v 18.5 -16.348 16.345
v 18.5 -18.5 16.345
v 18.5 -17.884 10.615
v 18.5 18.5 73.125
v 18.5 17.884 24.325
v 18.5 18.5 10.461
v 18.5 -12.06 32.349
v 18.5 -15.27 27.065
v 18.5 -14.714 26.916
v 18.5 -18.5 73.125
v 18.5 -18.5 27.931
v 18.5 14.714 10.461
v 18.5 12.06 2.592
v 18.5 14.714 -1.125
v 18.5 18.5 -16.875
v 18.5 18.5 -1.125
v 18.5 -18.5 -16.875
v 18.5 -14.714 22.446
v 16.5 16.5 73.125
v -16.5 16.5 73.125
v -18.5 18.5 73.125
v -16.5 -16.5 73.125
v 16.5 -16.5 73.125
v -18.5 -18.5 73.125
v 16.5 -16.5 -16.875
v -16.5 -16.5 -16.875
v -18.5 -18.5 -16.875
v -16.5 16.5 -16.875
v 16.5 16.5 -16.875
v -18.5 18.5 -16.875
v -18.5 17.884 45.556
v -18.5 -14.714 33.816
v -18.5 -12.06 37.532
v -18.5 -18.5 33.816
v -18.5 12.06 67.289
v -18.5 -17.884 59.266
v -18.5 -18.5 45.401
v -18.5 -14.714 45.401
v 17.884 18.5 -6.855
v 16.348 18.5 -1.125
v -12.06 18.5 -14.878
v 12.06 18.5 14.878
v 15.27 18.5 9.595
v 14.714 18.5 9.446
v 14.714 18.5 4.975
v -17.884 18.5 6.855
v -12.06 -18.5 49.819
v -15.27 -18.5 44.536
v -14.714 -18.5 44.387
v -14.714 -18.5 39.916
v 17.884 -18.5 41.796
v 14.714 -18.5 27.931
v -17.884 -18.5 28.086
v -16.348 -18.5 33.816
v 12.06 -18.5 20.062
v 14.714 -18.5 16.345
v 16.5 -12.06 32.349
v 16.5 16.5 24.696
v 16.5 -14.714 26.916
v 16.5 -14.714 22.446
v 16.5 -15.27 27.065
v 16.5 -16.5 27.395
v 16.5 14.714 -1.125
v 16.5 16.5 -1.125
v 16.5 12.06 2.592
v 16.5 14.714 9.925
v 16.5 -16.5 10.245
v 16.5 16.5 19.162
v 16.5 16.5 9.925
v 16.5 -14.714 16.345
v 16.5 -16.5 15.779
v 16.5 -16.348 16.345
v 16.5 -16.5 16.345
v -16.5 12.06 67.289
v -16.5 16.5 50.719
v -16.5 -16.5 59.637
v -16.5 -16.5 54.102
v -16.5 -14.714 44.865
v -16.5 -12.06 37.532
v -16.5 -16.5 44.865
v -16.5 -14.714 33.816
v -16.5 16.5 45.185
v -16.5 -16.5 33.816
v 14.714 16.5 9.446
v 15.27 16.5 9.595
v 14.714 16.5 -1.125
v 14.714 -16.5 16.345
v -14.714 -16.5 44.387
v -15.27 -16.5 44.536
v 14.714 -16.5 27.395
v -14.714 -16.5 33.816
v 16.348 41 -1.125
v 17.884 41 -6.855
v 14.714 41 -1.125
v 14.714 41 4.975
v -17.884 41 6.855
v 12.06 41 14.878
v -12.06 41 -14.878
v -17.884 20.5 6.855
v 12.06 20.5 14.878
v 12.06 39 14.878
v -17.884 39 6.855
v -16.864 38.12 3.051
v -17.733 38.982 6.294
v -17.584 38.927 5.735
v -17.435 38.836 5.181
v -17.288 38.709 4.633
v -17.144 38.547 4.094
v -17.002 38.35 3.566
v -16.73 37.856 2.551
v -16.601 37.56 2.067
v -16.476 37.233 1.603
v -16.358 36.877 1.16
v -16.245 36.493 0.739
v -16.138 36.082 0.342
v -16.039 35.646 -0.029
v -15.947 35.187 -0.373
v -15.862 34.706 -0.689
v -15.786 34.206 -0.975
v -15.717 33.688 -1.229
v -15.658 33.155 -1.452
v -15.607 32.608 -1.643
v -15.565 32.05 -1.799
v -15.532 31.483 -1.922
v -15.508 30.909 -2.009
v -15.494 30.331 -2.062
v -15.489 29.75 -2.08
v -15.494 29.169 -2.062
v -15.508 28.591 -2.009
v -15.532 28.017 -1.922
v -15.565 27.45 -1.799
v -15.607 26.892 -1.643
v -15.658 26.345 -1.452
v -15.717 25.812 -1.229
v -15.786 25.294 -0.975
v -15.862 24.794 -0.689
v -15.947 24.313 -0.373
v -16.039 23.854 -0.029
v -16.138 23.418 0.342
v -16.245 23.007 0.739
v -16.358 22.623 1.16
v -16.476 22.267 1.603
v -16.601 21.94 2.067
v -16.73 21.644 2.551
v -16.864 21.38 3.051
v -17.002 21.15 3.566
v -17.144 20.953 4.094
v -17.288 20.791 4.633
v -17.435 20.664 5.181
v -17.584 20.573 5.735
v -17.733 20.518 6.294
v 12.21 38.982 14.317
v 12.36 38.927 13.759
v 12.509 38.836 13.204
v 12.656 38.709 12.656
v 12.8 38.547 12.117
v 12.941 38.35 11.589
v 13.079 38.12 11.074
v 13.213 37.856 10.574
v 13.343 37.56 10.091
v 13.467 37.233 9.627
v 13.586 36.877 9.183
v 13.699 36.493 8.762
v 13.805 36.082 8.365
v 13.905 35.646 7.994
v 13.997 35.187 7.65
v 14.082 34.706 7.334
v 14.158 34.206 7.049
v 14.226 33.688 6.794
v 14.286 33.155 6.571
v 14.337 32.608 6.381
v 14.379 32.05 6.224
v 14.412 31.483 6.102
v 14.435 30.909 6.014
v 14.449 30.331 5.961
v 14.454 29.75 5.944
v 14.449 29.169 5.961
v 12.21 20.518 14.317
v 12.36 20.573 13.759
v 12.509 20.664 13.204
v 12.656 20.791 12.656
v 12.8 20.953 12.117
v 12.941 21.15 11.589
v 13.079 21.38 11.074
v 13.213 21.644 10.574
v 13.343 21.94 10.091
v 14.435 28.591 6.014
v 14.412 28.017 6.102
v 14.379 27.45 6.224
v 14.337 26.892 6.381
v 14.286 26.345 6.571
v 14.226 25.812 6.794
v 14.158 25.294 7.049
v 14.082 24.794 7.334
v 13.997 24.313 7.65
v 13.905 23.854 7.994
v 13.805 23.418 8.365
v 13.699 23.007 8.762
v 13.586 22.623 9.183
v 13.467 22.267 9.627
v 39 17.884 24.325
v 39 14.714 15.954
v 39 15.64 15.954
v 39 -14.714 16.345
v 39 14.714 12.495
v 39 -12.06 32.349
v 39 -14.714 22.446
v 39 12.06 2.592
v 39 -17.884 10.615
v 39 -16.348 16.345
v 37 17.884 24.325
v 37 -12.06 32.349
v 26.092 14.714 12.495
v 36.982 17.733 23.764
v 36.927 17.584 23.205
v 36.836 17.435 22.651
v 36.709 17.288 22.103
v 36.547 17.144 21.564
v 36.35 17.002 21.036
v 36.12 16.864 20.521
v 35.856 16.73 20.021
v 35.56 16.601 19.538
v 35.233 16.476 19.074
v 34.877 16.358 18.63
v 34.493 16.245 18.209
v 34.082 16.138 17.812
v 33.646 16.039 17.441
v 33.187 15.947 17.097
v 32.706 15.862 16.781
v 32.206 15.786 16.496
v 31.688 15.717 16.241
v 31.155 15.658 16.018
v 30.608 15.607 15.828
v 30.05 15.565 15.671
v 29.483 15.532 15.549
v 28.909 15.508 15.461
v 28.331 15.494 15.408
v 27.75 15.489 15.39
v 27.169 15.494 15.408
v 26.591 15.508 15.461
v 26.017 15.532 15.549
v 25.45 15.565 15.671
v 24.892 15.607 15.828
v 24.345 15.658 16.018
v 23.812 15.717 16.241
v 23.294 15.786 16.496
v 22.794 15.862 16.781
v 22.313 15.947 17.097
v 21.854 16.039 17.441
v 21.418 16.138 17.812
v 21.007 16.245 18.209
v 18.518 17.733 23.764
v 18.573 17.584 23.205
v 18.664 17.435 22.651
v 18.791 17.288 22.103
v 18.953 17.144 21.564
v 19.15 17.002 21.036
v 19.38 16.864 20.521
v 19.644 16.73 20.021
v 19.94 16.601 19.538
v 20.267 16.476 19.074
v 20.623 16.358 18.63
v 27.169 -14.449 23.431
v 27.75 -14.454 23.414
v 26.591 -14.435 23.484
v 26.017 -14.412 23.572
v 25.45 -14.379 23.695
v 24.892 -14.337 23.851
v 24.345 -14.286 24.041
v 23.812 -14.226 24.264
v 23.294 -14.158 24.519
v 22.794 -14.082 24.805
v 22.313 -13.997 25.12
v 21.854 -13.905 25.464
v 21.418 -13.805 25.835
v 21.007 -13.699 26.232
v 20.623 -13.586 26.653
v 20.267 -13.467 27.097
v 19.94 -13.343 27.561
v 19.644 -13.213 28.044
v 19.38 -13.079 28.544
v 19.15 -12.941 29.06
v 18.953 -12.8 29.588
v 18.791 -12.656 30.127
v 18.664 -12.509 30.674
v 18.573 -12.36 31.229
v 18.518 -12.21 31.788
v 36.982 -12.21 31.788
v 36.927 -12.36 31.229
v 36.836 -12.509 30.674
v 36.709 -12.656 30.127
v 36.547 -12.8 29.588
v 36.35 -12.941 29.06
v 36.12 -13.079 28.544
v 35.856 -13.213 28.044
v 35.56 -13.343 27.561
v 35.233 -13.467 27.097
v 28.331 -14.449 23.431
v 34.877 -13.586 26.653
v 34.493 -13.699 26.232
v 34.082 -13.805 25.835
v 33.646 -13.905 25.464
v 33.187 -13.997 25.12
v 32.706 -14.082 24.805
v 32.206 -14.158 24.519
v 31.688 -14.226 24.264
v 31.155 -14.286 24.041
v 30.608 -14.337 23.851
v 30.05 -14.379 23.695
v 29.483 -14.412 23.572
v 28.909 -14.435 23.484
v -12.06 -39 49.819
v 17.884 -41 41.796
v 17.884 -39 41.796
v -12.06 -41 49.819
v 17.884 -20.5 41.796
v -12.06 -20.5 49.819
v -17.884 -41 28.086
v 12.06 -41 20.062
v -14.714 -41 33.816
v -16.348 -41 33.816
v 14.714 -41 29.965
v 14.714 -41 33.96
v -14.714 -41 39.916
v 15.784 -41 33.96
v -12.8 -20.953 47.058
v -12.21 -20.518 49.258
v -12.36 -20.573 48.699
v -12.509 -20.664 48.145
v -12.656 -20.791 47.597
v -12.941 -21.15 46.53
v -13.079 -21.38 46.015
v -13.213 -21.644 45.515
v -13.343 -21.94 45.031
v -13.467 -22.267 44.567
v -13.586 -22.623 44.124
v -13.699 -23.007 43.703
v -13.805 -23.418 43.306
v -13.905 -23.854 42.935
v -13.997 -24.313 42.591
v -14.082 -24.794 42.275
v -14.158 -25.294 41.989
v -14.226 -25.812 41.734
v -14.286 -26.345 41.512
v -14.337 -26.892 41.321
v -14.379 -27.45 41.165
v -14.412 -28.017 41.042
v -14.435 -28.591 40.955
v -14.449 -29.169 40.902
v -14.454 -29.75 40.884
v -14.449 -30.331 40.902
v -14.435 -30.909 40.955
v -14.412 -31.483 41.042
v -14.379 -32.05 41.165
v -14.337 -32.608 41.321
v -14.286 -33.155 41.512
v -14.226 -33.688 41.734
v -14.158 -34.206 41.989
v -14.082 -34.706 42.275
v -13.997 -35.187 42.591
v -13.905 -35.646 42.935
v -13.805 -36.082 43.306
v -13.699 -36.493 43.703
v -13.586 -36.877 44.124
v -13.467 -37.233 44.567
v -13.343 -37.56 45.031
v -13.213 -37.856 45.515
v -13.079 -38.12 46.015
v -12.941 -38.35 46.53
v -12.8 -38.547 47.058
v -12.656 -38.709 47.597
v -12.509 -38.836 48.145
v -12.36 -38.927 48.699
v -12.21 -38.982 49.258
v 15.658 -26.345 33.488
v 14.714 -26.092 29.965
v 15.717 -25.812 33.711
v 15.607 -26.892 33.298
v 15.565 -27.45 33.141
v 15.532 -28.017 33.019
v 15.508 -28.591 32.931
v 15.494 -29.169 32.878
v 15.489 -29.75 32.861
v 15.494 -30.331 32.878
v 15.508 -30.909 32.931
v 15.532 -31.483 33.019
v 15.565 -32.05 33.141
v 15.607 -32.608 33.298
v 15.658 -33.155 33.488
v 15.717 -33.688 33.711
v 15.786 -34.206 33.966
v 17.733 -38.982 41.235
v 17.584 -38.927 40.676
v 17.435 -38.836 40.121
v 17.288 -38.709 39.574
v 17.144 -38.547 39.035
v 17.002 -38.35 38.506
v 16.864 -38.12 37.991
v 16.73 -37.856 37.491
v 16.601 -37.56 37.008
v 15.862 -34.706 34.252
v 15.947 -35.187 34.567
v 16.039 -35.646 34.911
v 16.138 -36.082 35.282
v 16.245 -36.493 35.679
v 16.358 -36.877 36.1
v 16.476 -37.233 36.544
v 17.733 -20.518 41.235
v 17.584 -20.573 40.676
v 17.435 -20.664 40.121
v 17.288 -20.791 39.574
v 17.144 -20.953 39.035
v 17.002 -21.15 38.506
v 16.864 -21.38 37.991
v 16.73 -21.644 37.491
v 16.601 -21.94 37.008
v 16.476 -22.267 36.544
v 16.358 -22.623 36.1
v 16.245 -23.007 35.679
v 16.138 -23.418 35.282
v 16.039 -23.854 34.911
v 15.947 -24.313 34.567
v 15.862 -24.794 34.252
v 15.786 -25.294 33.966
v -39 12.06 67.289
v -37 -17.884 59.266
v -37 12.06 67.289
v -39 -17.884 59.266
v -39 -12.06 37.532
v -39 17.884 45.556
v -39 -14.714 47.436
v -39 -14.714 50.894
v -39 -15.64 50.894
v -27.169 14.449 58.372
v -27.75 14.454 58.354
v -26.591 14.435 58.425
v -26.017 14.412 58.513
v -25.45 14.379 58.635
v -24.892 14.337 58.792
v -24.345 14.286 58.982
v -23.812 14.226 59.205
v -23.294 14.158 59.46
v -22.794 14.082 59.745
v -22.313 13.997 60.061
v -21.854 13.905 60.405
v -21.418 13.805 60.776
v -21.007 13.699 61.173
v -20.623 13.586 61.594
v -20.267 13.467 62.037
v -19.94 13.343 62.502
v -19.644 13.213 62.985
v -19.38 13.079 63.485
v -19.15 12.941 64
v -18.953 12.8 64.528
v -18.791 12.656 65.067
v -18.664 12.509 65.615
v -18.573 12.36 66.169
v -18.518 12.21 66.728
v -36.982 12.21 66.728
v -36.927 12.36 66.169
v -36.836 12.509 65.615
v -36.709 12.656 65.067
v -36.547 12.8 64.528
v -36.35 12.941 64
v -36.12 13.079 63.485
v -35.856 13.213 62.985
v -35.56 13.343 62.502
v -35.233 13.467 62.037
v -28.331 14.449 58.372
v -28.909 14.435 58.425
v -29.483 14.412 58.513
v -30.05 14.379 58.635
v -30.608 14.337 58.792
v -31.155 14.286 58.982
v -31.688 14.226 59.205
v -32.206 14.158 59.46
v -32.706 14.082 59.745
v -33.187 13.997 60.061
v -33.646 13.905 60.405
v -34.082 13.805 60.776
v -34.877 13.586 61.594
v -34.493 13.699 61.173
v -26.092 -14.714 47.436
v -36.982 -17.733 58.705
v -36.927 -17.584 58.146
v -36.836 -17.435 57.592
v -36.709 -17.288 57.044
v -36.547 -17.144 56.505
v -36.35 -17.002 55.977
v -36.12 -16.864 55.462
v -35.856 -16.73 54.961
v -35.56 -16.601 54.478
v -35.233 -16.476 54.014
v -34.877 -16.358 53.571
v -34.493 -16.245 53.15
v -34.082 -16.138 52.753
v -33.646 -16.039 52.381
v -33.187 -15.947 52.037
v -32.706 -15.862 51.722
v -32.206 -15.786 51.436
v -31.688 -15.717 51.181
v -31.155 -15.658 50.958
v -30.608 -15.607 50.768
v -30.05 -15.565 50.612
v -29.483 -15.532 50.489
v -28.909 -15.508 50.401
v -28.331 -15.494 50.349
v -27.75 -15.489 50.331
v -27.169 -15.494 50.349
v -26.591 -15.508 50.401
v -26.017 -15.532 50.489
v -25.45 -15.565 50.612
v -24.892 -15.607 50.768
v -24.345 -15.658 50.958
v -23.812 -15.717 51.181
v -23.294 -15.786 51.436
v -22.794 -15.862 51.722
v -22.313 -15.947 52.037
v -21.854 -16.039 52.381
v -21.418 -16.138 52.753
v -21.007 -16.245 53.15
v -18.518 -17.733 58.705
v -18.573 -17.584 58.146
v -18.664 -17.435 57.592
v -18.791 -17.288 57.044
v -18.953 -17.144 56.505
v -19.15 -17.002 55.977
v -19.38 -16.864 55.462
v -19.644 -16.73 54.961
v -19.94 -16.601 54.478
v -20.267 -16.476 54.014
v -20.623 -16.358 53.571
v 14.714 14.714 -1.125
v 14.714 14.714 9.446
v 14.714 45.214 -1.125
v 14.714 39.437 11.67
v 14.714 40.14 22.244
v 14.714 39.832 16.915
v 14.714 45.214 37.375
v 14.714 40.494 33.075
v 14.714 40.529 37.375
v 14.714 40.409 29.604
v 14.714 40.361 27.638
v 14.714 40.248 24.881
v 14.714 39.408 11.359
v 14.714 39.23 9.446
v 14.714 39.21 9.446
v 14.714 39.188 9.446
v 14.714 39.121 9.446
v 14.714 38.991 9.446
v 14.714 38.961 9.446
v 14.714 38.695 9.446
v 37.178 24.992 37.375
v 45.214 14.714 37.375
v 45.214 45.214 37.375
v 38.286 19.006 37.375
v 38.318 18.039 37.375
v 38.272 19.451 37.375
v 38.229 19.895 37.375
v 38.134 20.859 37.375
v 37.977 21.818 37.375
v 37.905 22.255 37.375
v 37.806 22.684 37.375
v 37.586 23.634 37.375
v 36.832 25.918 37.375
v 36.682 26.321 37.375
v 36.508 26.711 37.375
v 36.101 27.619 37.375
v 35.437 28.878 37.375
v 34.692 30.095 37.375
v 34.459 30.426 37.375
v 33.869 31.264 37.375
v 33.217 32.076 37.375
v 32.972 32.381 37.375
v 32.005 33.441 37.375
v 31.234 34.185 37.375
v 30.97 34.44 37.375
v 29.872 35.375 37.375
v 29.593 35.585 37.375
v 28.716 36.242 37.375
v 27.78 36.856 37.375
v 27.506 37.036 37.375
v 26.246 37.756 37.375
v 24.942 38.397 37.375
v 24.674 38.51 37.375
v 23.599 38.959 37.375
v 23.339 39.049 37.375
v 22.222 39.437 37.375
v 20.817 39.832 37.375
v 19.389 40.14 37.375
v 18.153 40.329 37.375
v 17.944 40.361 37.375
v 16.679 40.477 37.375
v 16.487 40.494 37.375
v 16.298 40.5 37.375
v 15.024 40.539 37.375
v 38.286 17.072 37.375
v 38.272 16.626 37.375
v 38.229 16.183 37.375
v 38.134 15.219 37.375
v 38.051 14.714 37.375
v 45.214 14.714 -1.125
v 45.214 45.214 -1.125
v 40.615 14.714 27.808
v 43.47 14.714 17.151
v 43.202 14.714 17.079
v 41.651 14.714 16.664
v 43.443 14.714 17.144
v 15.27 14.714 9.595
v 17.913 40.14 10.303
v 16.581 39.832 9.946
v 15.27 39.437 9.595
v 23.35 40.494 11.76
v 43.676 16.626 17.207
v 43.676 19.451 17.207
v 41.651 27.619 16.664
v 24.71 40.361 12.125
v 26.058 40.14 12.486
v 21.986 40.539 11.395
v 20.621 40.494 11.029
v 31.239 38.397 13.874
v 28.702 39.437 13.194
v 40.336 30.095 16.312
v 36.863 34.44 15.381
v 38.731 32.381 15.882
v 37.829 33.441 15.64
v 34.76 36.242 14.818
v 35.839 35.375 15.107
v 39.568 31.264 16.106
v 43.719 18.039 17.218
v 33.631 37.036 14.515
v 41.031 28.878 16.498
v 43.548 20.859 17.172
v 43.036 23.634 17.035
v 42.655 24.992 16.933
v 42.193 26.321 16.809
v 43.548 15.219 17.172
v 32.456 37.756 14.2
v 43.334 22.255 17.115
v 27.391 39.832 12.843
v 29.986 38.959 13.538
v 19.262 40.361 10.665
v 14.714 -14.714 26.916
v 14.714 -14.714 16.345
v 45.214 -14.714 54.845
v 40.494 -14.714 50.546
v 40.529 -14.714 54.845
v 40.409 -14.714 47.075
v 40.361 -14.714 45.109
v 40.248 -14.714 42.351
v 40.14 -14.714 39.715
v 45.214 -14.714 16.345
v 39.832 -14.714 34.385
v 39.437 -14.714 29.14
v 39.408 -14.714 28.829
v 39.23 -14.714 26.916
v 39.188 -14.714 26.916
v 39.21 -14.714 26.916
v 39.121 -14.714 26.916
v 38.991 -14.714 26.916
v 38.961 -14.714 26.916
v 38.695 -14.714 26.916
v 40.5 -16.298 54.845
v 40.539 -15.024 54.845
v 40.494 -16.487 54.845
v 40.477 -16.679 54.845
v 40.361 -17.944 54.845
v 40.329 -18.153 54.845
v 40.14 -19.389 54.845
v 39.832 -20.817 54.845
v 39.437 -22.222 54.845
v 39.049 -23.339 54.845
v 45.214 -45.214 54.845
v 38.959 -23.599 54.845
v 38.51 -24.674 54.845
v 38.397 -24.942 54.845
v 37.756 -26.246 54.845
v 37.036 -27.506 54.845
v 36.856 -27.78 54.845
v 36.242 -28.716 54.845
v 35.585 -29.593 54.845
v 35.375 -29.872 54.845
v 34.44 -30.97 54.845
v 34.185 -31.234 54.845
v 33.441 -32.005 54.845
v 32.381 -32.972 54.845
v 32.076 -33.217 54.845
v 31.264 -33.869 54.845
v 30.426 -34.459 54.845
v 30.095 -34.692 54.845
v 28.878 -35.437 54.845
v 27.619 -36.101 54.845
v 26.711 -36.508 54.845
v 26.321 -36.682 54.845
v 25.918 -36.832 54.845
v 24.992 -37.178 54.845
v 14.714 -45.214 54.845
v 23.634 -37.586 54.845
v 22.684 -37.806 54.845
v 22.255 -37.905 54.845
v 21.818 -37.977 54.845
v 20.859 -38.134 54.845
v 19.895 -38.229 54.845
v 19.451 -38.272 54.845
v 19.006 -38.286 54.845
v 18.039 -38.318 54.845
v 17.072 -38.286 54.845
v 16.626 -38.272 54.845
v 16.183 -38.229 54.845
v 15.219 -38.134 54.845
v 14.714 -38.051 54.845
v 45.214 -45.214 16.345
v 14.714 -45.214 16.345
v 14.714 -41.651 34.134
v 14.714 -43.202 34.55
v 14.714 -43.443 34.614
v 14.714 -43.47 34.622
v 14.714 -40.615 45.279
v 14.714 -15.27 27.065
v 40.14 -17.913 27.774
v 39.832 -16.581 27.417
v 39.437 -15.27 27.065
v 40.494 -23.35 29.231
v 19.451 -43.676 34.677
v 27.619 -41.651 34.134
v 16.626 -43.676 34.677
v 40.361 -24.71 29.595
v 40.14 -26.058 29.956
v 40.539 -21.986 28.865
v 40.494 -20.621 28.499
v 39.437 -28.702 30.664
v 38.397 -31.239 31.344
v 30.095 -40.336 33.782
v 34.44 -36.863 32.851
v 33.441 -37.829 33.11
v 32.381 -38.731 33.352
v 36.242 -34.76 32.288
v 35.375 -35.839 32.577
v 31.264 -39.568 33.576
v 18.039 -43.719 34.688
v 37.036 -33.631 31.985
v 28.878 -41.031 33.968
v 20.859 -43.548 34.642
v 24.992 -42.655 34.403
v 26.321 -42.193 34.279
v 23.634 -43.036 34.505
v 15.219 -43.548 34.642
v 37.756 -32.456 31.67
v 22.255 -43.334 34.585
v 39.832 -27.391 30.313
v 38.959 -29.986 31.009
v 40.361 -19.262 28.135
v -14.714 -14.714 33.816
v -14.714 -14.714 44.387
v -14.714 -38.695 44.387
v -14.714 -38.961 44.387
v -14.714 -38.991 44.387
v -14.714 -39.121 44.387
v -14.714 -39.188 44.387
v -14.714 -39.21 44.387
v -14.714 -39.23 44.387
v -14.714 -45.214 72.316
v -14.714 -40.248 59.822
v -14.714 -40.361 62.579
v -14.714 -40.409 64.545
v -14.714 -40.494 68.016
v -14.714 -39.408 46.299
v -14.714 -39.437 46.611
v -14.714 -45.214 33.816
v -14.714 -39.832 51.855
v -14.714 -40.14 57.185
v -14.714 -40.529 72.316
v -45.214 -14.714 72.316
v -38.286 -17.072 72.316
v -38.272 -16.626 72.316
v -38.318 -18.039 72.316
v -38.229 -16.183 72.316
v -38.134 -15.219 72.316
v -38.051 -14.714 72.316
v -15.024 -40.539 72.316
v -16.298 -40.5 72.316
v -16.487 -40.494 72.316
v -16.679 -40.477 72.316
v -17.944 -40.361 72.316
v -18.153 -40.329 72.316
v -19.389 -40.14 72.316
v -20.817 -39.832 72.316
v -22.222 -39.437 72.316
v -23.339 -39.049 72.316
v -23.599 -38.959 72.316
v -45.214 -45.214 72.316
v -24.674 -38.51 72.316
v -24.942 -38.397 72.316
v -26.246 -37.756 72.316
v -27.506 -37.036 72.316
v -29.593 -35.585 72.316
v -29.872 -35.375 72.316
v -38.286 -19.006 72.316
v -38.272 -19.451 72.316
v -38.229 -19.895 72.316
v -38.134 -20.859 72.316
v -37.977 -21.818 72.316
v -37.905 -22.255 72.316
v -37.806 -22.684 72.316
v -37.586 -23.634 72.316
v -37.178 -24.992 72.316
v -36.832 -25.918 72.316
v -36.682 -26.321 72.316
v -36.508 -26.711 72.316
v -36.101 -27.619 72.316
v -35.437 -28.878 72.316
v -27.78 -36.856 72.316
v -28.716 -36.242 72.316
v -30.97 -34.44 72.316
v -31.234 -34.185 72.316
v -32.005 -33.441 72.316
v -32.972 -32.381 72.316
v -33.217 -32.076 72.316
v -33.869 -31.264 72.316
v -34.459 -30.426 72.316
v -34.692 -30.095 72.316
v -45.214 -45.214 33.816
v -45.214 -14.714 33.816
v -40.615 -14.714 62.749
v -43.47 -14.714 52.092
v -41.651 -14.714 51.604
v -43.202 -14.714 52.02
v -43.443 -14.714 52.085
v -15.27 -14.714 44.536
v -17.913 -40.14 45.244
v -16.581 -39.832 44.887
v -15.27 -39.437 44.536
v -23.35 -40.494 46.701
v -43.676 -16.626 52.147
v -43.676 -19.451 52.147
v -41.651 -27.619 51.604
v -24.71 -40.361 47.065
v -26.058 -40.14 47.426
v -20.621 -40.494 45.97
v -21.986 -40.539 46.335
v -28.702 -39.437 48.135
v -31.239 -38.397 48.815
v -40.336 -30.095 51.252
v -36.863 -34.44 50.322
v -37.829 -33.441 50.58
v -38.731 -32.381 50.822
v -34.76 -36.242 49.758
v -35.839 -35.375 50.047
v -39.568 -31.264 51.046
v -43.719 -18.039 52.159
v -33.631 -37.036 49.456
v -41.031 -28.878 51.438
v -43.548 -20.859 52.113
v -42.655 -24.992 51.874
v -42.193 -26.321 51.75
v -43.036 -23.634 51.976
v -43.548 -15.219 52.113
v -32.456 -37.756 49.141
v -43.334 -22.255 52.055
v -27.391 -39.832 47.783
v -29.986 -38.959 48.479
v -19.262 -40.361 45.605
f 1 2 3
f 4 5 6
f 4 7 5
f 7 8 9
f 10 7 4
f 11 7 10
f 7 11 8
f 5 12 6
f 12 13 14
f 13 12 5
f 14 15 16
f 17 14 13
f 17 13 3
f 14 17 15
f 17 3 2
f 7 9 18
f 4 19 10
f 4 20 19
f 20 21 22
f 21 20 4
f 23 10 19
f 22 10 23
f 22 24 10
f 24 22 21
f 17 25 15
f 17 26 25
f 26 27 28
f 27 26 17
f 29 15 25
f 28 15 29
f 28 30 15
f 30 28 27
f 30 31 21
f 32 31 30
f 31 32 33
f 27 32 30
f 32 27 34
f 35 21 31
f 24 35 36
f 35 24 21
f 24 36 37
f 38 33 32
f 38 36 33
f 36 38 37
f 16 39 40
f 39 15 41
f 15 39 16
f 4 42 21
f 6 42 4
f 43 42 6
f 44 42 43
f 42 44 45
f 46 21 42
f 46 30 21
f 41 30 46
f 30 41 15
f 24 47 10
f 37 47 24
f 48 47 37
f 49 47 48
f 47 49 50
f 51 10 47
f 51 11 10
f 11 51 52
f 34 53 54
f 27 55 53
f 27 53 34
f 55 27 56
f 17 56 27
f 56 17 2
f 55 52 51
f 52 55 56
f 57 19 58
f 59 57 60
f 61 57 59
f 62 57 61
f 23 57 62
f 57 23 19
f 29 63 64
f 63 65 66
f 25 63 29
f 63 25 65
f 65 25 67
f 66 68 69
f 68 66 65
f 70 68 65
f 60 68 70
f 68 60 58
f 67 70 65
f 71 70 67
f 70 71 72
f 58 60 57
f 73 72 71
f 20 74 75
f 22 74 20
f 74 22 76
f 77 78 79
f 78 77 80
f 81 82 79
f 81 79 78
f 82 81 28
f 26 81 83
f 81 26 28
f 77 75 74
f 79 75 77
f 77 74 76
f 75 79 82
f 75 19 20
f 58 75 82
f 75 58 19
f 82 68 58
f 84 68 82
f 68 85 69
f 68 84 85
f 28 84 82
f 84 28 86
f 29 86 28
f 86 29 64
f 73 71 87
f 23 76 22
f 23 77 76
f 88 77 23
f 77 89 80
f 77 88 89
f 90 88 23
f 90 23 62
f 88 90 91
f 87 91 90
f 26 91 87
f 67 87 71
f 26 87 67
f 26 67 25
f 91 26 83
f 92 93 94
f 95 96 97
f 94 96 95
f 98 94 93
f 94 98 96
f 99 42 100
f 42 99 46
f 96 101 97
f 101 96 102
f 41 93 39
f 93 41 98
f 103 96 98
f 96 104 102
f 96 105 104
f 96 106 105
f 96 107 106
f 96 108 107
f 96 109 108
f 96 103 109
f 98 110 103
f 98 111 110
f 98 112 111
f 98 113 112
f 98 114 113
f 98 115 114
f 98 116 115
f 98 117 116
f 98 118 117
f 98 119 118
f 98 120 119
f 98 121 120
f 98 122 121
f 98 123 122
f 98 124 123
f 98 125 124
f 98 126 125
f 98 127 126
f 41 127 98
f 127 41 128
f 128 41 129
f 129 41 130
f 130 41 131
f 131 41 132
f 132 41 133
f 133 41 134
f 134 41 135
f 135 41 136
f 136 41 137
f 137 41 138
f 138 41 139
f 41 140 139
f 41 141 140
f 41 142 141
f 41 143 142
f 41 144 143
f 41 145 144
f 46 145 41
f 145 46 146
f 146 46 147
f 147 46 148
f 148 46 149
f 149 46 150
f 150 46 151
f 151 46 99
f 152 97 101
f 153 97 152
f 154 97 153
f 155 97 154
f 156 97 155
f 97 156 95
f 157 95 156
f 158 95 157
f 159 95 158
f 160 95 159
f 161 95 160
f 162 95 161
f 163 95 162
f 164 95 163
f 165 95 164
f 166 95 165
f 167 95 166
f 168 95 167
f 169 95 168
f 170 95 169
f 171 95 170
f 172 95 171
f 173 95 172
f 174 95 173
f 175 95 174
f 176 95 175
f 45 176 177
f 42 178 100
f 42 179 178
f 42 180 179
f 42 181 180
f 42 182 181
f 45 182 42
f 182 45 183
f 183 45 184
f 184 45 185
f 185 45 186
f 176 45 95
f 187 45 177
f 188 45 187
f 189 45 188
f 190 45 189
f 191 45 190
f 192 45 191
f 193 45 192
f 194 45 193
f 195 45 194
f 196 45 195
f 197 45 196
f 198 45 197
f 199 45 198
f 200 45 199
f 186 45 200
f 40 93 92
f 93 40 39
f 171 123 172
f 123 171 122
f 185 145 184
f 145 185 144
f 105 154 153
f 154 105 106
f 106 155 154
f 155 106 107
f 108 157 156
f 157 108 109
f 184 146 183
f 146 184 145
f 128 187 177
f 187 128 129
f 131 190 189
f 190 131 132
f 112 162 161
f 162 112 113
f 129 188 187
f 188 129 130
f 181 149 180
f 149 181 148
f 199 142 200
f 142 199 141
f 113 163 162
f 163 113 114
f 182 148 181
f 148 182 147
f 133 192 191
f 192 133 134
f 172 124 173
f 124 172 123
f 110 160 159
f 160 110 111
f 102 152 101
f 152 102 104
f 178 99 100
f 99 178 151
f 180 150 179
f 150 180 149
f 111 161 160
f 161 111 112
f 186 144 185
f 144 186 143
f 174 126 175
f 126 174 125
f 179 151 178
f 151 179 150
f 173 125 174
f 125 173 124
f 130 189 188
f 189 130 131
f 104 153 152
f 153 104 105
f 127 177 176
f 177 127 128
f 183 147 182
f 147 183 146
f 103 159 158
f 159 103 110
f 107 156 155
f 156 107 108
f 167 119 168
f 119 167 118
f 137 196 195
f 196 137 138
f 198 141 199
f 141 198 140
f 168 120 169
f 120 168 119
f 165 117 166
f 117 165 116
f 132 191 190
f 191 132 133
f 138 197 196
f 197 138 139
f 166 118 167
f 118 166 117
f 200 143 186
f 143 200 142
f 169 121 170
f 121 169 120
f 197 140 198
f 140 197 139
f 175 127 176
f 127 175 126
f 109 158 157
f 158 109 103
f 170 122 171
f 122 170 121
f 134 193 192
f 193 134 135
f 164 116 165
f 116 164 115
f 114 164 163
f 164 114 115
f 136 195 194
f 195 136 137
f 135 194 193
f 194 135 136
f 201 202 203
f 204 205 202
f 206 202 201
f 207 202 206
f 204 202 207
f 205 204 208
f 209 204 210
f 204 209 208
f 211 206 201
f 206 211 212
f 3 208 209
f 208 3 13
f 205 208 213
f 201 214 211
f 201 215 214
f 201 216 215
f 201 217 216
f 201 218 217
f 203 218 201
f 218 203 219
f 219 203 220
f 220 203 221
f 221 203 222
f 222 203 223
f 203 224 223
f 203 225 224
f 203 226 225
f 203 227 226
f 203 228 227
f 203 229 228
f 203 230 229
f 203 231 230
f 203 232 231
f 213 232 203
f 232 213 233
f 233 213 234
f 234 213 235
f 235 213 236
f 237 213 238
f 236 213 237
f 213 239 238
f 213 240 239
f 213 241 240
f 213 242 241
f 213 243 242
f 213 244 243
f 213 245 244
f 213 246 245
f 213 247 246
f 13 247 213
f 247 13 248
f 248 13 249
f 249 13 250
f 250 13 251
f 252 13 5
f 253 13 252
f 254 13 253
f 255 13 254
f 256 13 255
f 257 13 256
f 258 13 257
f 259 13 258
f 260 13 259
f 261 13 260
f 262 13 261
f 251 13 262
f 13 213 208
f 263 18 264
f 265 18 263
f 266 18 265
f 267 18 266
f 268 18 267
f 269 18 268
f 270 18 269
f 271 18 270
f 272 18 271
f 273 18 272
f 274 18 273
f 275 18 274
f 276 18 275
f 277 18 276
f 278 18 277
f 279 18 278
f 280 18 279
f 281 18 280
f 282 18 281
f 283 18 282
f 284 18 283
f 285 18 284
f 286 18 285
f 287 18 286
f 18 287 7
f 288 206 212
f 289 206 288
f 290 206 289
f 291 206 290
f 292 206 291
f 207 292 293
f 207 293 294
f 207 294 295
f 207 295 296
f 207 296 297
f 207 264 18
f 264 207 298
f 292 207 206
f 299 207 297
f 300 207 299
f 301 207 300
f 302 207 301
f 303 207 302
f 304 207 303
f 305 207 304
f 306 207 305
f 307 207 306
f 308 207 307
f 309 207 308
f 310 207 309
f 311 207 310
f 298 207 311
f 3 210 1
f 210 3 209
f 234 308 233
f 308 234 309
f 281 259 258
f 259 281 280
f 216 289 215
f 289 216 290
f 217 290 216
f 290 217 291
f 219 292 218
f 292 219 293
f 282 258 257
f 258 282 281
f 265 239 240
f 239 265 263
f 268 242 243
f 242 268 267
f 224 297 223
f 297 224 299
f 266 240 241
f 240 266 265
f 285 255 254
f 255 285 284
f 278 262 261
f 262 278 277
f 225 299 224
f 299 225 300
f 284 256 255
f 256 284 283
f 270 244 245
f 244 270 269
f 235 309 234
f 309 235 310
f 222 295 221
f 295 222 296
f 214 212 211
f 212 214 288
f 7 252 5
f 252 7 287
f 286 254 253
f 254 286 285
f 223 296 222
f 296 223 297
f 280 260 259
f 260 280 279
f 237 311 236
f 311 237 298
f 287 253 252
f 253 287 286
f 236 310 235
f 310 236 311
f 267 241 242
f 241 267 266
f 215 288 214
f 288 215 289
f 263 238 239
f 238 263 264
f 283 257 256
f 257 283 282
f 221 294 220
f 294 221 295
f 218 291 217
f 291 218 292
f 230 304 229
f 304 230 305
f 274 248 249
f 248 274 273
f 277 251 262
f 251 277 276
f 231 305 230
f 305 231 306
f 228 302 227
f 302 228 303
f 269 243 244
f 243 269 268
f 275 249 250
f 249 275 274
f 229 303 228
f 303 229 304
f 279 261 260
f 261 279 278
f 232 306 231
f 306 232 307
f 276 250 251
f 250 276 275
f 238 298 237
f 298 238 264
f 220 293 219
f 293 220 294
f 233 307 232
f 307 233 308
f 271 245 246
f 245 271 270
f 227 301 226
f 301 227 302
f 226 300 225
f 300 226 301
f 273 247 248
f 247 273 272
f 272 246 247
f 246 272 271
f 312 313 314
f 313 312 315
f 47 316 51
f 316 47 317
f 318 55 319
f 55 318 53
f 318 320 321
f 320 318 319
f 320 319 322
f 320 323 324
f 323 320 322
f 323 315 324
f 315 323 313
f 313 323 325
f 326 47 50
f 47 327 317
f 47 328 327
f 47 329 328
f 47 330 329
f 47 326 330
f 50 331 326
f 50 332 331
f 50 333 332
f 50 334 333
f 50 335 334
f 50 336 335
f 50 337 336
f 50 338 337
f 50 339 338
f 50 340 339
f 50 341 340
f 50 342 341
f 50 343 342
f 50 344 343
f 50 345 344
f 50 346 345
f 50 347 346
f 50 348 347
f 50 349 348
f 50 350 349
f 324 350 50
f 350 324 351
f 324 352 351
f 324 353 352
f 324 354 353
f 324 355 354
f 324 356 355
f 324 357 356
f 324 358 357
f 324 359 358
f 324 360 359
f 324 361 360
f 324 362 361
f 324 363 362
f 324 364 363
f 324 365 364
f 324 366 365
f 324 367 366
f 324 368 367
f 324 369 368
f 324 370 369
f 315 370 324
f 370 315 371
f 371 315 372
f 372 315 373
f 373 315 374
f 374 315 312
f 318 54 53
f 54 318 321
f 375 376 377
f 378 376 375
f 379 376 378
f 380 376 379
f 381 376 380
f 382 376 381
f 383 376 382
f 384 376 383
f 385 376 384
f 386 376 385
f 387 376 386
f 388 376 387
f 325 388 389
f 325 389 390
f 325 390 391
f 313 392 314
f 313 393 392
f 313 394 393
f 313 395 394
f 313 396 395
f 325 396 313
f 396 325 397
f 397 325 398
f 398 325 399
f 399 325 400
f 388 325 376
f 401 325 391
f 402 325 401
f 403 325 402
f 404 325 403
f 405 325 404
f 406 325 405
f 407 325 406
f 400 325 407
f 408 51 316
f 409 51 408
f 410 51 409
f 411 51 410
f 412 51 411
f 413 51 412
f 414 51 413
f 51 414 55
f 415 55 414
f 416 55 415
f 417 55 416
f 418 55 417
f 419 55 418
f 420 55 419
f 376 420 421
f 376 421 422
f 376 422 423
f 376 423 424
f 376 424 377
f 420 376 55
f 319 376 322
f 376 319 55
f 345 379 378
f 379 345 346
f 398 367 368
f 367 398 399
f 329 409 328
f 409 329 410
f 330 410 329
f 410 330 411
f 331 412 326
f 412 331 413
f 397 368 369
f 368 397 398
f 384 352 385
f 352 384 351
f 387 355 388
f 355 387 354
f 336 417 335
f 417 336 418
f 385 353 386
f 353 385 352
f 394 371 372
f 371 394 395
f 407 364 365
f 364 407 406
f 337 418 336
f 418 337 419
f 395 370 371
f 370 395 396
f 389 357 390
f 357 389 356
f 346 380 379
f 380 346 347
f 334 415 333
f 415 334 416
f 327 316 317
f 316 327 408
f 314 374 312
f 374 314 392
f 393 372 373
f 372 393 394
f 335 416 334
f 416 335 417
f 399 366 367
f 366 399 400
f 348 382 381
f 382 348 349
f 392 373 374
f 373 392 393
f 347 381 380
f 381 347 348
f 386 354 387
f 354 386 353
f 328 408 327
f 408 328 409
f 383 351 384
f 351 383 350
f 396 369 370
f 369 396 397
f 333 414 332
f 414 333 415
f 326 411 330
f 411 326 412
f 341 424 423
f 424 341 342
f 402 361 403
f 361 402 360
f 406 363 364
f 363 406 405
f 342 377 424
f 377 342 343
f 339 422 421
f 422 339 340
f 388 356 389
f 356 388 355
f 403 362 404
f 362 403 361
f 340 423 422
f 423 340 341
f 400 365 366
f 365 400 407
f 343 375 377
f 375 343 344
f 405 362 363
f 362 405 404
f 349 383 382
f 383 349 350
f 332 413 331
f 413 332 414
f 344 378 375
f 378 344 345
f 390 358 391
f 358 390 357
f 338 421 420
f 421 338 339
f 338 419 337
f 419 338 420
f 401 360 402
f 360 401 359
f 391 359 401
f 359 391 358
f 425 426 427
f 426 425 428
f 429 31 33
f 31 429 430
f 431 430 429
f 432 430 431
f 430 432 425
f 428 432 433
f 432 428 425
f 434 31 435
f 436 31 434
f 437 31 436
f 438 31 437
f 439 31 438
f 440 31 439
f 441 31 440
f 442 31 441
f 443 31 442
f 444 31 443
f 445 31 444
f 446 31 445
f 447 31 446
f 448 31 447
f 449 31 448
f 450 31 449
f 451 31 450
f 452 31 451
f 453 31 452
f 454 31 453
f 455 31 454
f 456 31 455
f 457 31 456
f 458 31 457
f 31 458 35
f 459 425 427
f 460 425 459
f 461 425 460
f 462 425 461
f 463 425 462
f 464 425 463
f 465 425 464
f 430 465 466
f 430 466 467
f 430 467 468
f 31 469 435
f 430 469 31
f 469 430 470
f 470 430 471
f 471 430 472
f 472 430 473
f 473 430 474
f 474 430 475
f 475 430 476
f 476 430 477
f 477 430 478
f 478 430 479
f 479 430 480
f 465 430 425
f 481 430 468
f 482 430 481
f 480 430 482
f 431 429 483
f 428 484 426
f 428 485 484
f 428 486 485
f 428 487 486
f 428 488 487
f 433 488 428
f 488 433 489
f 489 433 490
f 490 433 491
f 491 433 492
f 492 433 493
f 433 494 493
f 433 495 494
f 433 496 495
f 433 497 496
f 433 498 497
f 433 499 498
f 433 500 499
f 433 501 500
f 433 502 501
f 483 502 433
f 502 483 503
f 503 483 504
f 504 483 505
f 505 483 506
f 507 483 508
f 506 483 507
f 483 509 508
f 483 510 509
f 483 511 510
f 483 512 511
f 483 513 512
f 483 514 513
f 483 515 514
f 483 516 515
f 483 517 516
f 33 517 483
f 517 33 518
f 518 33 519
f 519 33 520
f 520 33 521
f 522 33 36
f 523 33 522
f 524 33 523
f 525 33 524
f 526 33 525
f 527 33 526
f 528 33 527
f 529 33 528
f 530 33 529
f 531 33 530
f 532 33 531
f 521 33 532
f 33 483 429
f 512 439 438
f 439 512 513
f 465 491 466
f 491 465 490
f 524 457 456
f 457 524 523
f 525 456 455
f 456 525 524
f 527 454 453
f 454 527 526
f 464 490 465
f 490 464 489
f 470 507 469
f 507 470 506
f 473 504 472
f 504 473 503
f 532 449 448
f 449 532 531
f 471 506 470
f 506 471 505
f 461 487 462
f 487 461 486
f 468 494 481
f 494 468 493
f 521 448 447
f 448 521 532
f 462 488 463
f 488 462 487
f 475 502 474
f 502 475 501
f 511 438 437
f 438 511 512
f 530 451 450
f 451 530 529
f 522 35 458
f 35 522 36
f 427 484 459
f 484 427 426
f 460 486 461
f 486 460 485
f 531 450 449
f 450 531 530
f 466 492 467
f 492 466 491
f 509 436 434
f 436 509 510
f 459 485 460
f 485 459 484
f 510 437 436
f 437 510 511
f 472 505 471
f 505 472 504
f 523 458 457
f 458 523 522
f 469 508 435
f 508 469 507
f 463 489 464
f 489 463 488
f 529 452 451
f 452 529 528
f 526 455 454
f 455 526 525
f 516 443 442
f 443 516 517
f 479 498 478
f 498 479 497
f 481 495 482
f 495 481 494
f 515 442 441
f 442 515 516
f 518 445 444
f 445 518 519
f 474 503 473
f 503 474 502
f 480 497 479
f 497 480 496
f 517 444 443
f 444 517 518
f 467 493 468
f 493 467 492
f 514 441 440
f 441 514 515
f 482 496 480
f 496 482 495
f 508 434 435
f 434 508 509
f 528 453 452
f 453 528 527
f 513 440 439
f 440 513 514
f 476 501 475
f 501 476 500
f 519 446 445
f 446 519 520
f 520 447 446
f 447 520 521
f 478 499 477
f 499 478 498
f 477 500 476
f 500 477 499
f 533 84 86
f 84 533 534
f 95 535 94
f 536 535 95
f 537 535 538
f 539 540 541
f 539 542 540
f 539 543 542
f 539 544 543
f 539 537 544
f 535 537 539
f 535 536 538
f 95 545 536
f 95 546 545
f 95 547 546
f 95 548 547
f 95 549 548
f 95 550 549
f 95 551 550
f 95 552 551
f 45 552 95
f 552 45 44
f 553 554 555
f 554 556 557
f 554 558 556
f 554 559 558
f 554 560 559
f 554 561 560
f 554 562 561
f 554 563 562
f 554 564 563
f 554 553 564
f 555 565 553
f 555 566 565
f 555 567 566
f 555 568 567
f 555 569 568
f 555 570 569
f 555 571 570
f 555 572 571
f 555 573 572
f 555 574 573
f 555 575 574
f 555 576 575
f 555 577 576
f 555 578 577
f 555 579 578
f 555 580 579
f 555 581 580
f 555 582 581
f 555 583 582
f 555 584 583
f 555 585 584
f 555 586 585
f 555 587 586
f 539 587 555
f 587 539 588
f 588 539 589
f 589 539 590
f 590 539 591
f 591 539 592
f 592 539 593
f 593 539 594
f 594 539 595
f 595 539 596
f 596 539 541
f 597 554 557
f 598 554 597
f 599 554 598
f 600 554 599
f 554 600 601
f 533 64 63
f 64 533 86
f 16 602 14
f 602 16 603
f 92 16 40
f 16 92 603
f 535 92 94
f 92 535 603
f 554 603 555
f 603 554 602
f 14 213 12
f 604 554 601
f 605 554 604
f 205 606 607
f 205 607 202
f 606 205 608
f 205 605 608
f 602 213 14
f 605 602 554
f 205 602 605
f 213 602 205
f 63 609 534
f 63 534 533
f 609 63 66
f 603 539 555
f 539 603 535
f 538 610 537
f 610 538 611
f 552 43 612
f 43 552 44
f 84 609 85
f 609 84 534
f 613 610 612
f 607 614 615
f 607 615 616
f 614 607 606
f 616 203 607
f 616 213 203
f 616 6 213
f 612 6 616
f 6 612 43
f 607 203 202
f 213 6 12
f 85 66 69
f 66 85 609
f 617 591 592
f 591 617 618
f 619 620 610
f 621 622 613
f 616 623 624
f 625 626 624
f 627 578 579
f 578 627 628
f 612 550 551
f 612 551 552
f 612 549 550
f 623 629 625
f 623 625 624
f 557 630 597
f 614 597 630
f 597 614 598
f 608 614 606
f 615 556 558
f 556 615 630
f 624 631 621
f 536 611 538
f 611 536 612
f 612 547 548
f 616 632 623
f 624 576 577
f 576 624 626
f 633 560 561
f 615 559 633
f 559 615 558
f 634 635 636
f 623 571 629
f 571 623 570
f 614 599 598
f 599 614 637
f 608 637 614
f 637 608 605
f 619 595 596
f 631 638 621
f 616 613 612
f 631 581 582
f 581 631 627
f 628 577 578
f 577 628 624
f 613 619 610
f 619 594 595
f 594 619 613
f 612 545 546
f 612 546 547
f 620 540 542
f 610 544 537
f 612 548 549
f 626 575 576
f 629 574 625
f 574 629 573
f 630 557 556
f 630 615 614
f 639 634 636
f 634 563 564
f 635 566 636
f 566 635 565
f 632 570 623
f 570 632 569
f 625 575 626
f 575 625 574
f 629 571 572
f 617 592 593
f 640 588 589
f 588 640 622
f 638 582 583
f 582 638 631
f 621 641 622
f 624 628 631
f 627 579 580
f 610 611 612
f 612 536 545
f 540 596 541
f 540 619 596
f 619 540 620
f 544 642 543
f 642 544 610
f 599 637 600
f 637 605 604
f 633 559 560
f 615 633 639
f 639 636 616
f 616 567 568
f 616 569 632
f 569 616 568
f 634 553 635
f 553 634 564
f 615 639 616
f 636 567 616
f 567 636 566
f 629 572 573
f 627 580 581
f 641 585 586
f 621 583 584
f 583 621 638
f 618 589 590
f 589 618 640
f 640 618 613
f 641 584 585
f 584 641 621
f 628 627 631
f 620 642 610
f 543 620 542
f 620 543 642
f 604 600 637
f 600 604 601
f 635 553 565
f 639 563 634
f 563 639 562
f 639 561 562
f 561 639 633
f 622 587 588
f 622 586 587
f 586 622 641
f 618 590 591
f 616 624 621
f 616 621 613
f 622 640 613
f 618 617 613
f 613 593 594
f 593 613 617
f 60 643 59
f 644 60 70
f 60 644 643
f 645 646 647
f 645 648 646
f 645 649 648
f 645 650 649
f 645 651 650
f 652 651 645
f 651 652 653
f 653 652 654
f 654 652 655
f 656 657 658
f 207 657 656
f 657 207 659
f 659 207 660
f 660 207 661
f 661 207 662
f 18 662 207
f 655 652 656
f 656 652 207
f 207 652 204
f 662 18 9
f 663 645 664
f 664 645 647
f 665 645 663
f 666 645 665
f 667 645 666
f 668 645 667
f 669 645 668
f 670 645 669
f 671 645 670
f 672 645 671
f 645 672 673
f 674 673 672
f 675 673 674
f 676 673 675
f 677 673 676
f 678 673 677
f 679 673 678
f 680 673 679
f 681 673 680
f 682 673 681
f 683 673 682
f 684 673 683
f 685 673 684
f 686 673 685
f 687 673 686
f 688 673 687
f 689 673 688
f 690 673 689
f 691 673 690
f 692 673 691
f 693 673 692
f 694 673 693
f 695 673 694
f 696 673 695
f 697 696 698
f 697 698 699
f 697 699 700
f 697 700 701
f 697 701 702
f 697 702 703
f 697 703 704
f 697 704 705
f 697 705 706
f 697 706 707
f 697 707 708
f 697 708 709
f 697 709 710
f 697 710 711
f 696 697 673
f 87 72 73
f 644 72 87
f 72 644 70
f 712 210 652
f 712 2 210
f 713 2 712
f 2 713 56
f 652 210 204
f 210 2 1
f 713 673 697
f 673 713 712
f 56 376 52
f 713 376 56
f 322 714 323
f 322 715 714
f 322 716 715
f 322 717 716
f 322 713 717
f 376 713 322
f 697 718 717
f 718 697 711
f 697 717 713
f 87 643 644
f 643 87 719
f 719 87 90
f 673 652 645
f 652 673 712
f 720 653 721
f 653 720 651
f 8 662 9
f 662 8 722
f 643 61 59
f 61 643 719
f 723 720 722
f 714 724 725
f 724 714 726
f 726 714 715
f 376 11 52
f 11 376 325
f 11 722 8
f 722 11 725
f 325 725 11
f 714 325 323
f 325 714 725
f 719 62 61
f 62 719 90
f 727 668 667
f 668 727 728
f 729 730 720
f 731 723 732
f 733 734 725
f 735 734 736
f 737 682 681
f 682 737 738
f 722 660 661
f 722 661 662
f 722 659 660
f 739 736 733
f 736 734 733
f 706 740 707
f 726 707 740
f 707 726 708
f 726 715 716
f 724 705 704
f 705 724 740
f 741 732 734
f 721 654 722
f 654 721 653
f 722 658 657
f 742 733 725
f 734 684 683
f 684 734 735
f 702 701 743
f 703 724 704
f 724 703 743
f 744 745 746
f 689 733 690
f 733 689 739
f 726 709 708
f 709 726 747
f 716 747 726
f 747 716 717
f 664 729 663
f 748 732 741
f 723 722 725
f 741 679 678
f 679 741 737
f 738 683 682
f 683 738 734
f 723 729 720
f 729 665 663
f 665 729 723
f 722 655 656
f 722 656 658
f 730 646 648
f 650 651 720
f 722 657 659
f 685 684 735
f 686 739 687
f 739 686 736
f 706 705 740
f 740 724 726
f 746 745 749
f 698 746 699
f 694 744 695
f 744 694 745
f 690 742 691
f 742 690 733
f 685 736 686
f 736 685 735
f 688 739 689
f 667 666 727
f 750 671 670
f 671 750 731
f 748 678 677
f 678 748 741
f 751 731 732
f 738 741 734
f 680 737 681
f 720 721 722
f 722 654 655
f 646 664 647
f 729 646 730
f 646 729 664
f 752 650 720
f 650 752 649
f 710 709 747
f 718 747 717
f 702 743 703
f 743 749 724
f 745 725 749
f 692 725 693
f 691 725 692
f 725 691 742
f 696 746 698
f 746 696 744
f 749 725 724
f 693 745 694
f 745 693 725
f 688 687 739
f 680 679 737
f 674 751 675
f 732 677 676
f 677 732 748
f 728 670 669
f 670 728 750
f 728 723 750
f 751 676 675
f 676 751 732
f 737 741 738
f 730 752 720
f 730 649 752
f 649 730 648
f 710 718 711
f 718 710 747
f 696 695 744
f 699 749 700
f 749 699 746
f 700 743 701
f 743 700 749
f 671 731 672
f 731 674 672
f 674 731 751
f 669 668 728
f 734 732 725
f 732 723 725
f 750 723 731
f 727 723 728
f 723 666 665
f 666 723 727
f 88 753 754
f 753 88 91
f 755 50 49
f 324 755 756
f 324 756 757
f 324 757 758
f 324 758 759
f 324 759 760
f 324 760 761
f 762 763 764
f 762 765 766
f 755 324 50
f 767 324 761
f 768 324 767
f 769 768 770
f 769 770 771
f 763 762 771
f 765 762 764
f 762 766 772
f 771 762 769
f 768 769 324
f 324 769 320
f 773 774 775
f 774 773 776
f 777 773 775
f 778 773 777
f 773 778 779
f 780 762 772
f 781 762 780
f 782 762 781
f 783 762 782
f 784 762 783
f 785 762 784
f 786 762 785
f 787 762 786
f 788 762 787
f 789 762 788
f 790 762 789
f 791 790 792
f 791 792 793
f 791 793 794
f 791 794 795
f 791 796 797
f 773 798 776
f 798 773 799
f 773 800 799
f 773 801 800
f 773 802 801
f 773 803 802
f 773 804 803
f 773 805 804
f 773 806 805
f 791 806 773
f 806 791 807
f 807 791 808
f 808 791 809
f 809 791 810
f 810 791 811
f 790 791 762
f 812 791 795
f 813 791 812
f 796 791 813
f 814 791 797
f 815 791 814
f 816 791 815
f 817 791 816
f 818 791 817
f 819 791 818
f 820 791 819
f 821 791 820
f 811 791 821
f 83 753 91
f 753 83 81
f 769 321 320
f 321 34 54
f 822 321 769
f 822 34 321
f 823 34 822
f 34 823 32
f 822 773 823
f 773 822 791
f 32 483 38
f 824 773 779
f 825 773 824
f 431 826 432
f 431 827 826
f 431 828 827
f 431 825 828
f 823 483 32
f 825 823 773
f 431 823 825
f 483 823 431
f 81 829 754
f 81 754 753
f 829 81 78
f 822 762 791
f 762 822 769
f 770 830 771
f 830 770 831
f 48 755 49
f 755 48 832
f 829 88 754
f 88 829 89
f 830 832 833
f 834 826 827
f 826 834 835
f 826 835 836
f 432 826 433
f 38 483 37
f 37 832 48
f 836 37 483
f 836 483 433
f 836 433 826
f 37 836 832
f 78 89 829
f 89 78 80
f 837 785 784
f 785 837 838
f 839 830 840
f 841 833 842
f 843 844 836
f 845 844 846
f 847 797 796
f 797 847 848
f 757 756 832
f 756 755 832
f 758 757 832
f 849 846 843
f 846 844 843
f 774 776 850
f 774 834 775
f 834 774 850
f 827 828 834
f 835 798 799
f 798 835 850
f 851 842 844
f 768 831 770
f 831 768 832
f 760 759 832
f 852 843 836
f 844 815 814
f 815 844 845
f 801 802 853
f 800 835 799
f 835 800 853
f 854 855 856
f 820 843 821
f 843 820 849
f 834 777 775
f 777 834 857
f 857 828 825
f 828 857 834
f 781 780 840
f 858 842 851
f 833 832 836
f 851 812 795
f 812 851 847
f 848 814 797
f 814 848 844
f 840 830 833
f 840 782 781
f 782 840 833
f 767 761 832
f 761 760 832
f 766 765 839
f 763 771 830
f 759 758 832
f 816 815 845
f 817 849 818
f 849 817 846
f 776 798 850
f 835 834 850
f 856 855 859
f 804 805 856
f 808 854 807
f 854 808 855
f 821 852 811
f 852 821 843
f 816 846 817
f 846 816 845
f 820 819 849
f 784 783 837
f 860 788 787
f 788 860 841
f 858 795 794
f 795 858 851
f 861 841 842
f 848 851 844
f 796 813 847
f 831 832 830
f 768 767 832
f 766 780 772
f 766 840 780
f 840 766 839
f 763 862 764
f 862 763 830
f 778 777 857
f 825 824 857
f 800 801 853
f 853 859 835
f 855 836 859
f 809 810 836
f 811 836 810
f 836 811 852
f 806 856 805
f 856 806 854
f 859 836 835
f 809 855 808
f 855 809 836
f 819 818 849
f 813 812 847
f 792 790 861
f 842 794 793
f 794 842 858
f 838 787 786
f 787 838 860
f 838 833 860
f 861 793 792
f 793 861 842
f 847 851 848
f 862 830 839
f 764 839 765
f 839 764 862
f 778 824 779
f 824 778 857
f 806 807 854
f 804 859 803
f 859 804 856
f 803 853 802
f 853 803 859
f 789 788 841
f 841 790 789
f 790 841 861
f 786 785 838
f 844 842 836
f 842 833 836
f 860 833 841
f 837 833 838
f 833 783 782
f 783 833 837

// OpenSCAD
// file: primitive_modules.scad
/*******************************************************************************************/
/*********************************Base 3D Shape Modules*************************************/
/*******************************************************************************************/

module cube_base(width, length, height){
    cube(size = [width, length, height], center = true);
}

module cylinder_base(radius, height, resolution){
    cylinder(r = radius, h = height, $fn = resolution, center = true);
}

module cone_base(radius1, radius2, height, resolution){
    cylinder(r1 = radius1, r2 = radius2, h = height, $fn = resolution, center = true);
}

module sphere_base(radius, resolution){
    sphere(r = radius, $fn = resolution, center = true);
}
// file: variables.scad
cube_allowance = 0.5;
rad_allowance  = 0.25;
resolution     = 100;
face_r         = 10;
face_h         = 5;
eye_r          = 2;
eye_h          = face_h + cube_allowance;
smile_r        = 6;
smile_h        = eye_h;
    
wall_t         = 4;
ball_r         = 9 + rad_allowance ;
board_w        = ball_r * 2 + wall_t;//5;
board_h        = ball_r * 2 + wall_t;//20;
board_l        = ball_r * 3;

//top_ramp = 3;

z = sin(15) * board_h * 3;
    zc = [z * 0, 0, z * 1, 0, z * 2, 0, z * 3, 0, z * 4, 0, z * 5, 0, z * 6];
    x = [0, 1, 1, 0, -1, -1, -1, 0, 1, 1, 0];
    y = [0, 0, 1, 1, 1, 0, -1, -1, -1, 0, 0];
    r_xy = [-1, -1, 1, 1, -1, -1, 1, 1, -1, -1, 1];
    r_z  = [1, 0, 1, 0, 1, 0, 1, 0, 1, 0, 1];
    corner_rz = [180, 0, 90, 0, 0, 0, -90, 0];
    
magnet_h = 24 + cube_allowance;
magnet_r = 2 + rad_allowance;
bearing_r = 4 + rad_allowance;
pike_l    = 30;
// main file
include <variables.scad>
include <primitive_modules.scad>

/*******************************************************************************************/
/***********************************Sample 3D Model*****************************************/
/*******************************************************************************************/
/*
/*
/*
/***********************************Ramp Side**********************************************/
/* This is one of two modules that get combined to create the functional part of a ramp
 * down which a 16 mm diameter marble can travel.  The "sides" of the ramp, in contrast to the
 * "corners" of the ramp, will sit along the faces of a cubic tower, which shall act as a
 * support structure preventing the ramp from floating in mid air.
 * A ramp side is simply a cube from which a half cylinder has been subtracted.  The half
 * cylinder is centered such that the top face of the cube bisects the cylinder.  This
 * ensures that there will be enough of a wall to the ramp to accommodate a marble rolling
 * down it without falling over one side, while leaving the marble exposed for visual effect.
 */
module ramp_side(){
    difference(){
        //The outer hull of the side of the ramp
        cube_base(board_w, ball_r * 4 - wall_t * 1.5, board_h);
        //The hollow through which the marble can travel.
        //Translate in the positive z direction, then rotate about the x axis.
        translate([0, 0, board_h * 0.5])
        rotate([90, 0, 0])
        cylinder_base(ball_r, ball_r * 4 + cube_allowance, 100);
    }
}
/***********************************Ramp Corner********************************************/
/* This is the second of two modules that get combined to create the functional part of a ramp
 * down which a 16 mm diameter marble can travel.  This module is called a "corner" due to
 * the fact that it is meant to be placed at the corners of the support tower that will
 * run the length of the spiral ramp.  Similar to the ramp sides, the corners are designed from
 * carving out a curved shape from a cube.  The main difference here is that, for the side
 * module, the cylinder that produces the curve is rotated 15 degrees, not the 90 degrees of
 * the ramp sides.  Because cylinders default to being upright in OpenSCAD, this means there is
 * just enough slope to this ramp corner to keep the flat part of the cylindrical cutout from
 * merely being a landing upon which a marble would stop.  The 15 degree tilt allows the marble
 * to bounce off of the curved surface of the cylindrical cutout, and then follow gravity down
 * the subtle slope.
 */

module ramp_corner(){
    difference(){
        translate([0, 0, -wall_t * 2])
        cube_base(board_w + wall_t * 2, board_w + wall_t * 2, board_h + wall_t * 4);
        translate([(board_w + wall_t) * 0.45, (board_w + wall_t) * 0.45, 0    ])
        rotate([0, 15, 0])
        cylinder_base(ball_r * 2 + wall_t, board_h + wall_t * 2, resolution);
    }
}
/***********************************Simple Twist*******************************************/
module simple_twist(top_ramp){
    //Using sine and cosine, create a square shaped cascading ramp.
    //Here, five sides of the ramp are placed.
    for(index = [0:top_ramp]){
        translate([sin(180 * index/2) * board_l, cos(180 * index/2) * (board_l + wall_t/2), z * index])
        rotate([0, 0, 90 * r_z[index]])
        
        rotate([15 * r_xy[index], 0, 0])
        ramp_side();
    }
    //Using a larger swath of the sine and cosine curves, place ramp corner pieces.
    //These pieces should provide a backboard for a marble rolling down one ramp segment/side,
    //as well as an avenue for transitioning to the next ramp.  As of 09 Oct, 2018, these pieces may
    //be too narrow for the intended function.
    for(index = [0:top_ramp + 2]){
        translate([sin(180 * index/4) * (board_l + board_w * 0.65), cos(180 * index/4) * (board_l + board_w * 0.65), zc[index-1] + board_h * 0.75])
        rotate([0, 0, 90 * r_z[index]])
        if(index%2 != 0){
            rotate([0, 0, corner_rz[index-1]])
            translate([0, 0, ball_r]){
              ramp_corner();
            }
        }
    }
}

/***********************************Twist Ramp*********************************************/
module twist_ramp(){
    
    //Union groups structures, along with their transformations.  Any further transformations,
    //or other operations performed upon a union (e.g. scale()) apply to everything within
    //the union block.  A union can be thought of as a more local way of grouping things
    //together than a module.  A module can be instantiated again and again anywhere downstream
    //of where it is defined.  A union exists in one location, and one location only.
    //If you wanted to have copies of what is in the union exist across your model, you
    //should make it a module instead.
    union(){
        translate([0, 0, board_h * 1.25])
        //Create a hollow cubic tower with each wall being of dimension wall_t/2.  (Why
        //wall_t/2, and not wall_t?)  
        //Difference allows one or more sets of structures to be subtracted (carved out
        //from) another set of structures.  As OpenSCAD executes top to bottom, that which 
        //is placed in earlier lines within the difference block defines the structure(s) 
        //from which everything else will be subtracted.
        difference(){
            cube_base(ball_r * 4, ball_r * 4, board_h * 4);
            cube_base(ball_r * 4 - wall_t, ball_r * 4 - wall_t, board_h * 4);
        }
        //Invoke the simple_twist module using three levels.  Notice, the twist is not
        //translated, but the above tower is.  This is because, the design of the
        //twist is such that a twist will not be centered as a whole.  The first level
        //is centered at the origin, while the rest is built on top of that level.
        //This means, if we want a tower supporting the inner hollow of the twist, but
        //create the tower using centered cubes, it will not be properly aligned with the
        //twist unless one or both objects get translated.  The easier move is to translate the
        //tower.  Though, as a generalization, the better move may be to translate the
        //twist based on known z dimensions and the number of levels (in this case, 3).
        simple_twist(3);
        
        index = 5;
        translate([sin(180 * index/4) * (board_l + board_w * 0.65), cos(180 * index/4) * (board_l + board_w * 0.65), zc[index-1] + board_h * 0.75])
        rotate([0, 0, 90 * r_z[index]])
        if(index%2 != 0){
            rotate([0, 0, corner_rz[index-1]])
            translate([0, 0, ball_r]){
              ramp_corner();
            }
        }
    }
    
}

//Make use of the modules to render the 90 degree ramp/twist.
twist_ramp();
